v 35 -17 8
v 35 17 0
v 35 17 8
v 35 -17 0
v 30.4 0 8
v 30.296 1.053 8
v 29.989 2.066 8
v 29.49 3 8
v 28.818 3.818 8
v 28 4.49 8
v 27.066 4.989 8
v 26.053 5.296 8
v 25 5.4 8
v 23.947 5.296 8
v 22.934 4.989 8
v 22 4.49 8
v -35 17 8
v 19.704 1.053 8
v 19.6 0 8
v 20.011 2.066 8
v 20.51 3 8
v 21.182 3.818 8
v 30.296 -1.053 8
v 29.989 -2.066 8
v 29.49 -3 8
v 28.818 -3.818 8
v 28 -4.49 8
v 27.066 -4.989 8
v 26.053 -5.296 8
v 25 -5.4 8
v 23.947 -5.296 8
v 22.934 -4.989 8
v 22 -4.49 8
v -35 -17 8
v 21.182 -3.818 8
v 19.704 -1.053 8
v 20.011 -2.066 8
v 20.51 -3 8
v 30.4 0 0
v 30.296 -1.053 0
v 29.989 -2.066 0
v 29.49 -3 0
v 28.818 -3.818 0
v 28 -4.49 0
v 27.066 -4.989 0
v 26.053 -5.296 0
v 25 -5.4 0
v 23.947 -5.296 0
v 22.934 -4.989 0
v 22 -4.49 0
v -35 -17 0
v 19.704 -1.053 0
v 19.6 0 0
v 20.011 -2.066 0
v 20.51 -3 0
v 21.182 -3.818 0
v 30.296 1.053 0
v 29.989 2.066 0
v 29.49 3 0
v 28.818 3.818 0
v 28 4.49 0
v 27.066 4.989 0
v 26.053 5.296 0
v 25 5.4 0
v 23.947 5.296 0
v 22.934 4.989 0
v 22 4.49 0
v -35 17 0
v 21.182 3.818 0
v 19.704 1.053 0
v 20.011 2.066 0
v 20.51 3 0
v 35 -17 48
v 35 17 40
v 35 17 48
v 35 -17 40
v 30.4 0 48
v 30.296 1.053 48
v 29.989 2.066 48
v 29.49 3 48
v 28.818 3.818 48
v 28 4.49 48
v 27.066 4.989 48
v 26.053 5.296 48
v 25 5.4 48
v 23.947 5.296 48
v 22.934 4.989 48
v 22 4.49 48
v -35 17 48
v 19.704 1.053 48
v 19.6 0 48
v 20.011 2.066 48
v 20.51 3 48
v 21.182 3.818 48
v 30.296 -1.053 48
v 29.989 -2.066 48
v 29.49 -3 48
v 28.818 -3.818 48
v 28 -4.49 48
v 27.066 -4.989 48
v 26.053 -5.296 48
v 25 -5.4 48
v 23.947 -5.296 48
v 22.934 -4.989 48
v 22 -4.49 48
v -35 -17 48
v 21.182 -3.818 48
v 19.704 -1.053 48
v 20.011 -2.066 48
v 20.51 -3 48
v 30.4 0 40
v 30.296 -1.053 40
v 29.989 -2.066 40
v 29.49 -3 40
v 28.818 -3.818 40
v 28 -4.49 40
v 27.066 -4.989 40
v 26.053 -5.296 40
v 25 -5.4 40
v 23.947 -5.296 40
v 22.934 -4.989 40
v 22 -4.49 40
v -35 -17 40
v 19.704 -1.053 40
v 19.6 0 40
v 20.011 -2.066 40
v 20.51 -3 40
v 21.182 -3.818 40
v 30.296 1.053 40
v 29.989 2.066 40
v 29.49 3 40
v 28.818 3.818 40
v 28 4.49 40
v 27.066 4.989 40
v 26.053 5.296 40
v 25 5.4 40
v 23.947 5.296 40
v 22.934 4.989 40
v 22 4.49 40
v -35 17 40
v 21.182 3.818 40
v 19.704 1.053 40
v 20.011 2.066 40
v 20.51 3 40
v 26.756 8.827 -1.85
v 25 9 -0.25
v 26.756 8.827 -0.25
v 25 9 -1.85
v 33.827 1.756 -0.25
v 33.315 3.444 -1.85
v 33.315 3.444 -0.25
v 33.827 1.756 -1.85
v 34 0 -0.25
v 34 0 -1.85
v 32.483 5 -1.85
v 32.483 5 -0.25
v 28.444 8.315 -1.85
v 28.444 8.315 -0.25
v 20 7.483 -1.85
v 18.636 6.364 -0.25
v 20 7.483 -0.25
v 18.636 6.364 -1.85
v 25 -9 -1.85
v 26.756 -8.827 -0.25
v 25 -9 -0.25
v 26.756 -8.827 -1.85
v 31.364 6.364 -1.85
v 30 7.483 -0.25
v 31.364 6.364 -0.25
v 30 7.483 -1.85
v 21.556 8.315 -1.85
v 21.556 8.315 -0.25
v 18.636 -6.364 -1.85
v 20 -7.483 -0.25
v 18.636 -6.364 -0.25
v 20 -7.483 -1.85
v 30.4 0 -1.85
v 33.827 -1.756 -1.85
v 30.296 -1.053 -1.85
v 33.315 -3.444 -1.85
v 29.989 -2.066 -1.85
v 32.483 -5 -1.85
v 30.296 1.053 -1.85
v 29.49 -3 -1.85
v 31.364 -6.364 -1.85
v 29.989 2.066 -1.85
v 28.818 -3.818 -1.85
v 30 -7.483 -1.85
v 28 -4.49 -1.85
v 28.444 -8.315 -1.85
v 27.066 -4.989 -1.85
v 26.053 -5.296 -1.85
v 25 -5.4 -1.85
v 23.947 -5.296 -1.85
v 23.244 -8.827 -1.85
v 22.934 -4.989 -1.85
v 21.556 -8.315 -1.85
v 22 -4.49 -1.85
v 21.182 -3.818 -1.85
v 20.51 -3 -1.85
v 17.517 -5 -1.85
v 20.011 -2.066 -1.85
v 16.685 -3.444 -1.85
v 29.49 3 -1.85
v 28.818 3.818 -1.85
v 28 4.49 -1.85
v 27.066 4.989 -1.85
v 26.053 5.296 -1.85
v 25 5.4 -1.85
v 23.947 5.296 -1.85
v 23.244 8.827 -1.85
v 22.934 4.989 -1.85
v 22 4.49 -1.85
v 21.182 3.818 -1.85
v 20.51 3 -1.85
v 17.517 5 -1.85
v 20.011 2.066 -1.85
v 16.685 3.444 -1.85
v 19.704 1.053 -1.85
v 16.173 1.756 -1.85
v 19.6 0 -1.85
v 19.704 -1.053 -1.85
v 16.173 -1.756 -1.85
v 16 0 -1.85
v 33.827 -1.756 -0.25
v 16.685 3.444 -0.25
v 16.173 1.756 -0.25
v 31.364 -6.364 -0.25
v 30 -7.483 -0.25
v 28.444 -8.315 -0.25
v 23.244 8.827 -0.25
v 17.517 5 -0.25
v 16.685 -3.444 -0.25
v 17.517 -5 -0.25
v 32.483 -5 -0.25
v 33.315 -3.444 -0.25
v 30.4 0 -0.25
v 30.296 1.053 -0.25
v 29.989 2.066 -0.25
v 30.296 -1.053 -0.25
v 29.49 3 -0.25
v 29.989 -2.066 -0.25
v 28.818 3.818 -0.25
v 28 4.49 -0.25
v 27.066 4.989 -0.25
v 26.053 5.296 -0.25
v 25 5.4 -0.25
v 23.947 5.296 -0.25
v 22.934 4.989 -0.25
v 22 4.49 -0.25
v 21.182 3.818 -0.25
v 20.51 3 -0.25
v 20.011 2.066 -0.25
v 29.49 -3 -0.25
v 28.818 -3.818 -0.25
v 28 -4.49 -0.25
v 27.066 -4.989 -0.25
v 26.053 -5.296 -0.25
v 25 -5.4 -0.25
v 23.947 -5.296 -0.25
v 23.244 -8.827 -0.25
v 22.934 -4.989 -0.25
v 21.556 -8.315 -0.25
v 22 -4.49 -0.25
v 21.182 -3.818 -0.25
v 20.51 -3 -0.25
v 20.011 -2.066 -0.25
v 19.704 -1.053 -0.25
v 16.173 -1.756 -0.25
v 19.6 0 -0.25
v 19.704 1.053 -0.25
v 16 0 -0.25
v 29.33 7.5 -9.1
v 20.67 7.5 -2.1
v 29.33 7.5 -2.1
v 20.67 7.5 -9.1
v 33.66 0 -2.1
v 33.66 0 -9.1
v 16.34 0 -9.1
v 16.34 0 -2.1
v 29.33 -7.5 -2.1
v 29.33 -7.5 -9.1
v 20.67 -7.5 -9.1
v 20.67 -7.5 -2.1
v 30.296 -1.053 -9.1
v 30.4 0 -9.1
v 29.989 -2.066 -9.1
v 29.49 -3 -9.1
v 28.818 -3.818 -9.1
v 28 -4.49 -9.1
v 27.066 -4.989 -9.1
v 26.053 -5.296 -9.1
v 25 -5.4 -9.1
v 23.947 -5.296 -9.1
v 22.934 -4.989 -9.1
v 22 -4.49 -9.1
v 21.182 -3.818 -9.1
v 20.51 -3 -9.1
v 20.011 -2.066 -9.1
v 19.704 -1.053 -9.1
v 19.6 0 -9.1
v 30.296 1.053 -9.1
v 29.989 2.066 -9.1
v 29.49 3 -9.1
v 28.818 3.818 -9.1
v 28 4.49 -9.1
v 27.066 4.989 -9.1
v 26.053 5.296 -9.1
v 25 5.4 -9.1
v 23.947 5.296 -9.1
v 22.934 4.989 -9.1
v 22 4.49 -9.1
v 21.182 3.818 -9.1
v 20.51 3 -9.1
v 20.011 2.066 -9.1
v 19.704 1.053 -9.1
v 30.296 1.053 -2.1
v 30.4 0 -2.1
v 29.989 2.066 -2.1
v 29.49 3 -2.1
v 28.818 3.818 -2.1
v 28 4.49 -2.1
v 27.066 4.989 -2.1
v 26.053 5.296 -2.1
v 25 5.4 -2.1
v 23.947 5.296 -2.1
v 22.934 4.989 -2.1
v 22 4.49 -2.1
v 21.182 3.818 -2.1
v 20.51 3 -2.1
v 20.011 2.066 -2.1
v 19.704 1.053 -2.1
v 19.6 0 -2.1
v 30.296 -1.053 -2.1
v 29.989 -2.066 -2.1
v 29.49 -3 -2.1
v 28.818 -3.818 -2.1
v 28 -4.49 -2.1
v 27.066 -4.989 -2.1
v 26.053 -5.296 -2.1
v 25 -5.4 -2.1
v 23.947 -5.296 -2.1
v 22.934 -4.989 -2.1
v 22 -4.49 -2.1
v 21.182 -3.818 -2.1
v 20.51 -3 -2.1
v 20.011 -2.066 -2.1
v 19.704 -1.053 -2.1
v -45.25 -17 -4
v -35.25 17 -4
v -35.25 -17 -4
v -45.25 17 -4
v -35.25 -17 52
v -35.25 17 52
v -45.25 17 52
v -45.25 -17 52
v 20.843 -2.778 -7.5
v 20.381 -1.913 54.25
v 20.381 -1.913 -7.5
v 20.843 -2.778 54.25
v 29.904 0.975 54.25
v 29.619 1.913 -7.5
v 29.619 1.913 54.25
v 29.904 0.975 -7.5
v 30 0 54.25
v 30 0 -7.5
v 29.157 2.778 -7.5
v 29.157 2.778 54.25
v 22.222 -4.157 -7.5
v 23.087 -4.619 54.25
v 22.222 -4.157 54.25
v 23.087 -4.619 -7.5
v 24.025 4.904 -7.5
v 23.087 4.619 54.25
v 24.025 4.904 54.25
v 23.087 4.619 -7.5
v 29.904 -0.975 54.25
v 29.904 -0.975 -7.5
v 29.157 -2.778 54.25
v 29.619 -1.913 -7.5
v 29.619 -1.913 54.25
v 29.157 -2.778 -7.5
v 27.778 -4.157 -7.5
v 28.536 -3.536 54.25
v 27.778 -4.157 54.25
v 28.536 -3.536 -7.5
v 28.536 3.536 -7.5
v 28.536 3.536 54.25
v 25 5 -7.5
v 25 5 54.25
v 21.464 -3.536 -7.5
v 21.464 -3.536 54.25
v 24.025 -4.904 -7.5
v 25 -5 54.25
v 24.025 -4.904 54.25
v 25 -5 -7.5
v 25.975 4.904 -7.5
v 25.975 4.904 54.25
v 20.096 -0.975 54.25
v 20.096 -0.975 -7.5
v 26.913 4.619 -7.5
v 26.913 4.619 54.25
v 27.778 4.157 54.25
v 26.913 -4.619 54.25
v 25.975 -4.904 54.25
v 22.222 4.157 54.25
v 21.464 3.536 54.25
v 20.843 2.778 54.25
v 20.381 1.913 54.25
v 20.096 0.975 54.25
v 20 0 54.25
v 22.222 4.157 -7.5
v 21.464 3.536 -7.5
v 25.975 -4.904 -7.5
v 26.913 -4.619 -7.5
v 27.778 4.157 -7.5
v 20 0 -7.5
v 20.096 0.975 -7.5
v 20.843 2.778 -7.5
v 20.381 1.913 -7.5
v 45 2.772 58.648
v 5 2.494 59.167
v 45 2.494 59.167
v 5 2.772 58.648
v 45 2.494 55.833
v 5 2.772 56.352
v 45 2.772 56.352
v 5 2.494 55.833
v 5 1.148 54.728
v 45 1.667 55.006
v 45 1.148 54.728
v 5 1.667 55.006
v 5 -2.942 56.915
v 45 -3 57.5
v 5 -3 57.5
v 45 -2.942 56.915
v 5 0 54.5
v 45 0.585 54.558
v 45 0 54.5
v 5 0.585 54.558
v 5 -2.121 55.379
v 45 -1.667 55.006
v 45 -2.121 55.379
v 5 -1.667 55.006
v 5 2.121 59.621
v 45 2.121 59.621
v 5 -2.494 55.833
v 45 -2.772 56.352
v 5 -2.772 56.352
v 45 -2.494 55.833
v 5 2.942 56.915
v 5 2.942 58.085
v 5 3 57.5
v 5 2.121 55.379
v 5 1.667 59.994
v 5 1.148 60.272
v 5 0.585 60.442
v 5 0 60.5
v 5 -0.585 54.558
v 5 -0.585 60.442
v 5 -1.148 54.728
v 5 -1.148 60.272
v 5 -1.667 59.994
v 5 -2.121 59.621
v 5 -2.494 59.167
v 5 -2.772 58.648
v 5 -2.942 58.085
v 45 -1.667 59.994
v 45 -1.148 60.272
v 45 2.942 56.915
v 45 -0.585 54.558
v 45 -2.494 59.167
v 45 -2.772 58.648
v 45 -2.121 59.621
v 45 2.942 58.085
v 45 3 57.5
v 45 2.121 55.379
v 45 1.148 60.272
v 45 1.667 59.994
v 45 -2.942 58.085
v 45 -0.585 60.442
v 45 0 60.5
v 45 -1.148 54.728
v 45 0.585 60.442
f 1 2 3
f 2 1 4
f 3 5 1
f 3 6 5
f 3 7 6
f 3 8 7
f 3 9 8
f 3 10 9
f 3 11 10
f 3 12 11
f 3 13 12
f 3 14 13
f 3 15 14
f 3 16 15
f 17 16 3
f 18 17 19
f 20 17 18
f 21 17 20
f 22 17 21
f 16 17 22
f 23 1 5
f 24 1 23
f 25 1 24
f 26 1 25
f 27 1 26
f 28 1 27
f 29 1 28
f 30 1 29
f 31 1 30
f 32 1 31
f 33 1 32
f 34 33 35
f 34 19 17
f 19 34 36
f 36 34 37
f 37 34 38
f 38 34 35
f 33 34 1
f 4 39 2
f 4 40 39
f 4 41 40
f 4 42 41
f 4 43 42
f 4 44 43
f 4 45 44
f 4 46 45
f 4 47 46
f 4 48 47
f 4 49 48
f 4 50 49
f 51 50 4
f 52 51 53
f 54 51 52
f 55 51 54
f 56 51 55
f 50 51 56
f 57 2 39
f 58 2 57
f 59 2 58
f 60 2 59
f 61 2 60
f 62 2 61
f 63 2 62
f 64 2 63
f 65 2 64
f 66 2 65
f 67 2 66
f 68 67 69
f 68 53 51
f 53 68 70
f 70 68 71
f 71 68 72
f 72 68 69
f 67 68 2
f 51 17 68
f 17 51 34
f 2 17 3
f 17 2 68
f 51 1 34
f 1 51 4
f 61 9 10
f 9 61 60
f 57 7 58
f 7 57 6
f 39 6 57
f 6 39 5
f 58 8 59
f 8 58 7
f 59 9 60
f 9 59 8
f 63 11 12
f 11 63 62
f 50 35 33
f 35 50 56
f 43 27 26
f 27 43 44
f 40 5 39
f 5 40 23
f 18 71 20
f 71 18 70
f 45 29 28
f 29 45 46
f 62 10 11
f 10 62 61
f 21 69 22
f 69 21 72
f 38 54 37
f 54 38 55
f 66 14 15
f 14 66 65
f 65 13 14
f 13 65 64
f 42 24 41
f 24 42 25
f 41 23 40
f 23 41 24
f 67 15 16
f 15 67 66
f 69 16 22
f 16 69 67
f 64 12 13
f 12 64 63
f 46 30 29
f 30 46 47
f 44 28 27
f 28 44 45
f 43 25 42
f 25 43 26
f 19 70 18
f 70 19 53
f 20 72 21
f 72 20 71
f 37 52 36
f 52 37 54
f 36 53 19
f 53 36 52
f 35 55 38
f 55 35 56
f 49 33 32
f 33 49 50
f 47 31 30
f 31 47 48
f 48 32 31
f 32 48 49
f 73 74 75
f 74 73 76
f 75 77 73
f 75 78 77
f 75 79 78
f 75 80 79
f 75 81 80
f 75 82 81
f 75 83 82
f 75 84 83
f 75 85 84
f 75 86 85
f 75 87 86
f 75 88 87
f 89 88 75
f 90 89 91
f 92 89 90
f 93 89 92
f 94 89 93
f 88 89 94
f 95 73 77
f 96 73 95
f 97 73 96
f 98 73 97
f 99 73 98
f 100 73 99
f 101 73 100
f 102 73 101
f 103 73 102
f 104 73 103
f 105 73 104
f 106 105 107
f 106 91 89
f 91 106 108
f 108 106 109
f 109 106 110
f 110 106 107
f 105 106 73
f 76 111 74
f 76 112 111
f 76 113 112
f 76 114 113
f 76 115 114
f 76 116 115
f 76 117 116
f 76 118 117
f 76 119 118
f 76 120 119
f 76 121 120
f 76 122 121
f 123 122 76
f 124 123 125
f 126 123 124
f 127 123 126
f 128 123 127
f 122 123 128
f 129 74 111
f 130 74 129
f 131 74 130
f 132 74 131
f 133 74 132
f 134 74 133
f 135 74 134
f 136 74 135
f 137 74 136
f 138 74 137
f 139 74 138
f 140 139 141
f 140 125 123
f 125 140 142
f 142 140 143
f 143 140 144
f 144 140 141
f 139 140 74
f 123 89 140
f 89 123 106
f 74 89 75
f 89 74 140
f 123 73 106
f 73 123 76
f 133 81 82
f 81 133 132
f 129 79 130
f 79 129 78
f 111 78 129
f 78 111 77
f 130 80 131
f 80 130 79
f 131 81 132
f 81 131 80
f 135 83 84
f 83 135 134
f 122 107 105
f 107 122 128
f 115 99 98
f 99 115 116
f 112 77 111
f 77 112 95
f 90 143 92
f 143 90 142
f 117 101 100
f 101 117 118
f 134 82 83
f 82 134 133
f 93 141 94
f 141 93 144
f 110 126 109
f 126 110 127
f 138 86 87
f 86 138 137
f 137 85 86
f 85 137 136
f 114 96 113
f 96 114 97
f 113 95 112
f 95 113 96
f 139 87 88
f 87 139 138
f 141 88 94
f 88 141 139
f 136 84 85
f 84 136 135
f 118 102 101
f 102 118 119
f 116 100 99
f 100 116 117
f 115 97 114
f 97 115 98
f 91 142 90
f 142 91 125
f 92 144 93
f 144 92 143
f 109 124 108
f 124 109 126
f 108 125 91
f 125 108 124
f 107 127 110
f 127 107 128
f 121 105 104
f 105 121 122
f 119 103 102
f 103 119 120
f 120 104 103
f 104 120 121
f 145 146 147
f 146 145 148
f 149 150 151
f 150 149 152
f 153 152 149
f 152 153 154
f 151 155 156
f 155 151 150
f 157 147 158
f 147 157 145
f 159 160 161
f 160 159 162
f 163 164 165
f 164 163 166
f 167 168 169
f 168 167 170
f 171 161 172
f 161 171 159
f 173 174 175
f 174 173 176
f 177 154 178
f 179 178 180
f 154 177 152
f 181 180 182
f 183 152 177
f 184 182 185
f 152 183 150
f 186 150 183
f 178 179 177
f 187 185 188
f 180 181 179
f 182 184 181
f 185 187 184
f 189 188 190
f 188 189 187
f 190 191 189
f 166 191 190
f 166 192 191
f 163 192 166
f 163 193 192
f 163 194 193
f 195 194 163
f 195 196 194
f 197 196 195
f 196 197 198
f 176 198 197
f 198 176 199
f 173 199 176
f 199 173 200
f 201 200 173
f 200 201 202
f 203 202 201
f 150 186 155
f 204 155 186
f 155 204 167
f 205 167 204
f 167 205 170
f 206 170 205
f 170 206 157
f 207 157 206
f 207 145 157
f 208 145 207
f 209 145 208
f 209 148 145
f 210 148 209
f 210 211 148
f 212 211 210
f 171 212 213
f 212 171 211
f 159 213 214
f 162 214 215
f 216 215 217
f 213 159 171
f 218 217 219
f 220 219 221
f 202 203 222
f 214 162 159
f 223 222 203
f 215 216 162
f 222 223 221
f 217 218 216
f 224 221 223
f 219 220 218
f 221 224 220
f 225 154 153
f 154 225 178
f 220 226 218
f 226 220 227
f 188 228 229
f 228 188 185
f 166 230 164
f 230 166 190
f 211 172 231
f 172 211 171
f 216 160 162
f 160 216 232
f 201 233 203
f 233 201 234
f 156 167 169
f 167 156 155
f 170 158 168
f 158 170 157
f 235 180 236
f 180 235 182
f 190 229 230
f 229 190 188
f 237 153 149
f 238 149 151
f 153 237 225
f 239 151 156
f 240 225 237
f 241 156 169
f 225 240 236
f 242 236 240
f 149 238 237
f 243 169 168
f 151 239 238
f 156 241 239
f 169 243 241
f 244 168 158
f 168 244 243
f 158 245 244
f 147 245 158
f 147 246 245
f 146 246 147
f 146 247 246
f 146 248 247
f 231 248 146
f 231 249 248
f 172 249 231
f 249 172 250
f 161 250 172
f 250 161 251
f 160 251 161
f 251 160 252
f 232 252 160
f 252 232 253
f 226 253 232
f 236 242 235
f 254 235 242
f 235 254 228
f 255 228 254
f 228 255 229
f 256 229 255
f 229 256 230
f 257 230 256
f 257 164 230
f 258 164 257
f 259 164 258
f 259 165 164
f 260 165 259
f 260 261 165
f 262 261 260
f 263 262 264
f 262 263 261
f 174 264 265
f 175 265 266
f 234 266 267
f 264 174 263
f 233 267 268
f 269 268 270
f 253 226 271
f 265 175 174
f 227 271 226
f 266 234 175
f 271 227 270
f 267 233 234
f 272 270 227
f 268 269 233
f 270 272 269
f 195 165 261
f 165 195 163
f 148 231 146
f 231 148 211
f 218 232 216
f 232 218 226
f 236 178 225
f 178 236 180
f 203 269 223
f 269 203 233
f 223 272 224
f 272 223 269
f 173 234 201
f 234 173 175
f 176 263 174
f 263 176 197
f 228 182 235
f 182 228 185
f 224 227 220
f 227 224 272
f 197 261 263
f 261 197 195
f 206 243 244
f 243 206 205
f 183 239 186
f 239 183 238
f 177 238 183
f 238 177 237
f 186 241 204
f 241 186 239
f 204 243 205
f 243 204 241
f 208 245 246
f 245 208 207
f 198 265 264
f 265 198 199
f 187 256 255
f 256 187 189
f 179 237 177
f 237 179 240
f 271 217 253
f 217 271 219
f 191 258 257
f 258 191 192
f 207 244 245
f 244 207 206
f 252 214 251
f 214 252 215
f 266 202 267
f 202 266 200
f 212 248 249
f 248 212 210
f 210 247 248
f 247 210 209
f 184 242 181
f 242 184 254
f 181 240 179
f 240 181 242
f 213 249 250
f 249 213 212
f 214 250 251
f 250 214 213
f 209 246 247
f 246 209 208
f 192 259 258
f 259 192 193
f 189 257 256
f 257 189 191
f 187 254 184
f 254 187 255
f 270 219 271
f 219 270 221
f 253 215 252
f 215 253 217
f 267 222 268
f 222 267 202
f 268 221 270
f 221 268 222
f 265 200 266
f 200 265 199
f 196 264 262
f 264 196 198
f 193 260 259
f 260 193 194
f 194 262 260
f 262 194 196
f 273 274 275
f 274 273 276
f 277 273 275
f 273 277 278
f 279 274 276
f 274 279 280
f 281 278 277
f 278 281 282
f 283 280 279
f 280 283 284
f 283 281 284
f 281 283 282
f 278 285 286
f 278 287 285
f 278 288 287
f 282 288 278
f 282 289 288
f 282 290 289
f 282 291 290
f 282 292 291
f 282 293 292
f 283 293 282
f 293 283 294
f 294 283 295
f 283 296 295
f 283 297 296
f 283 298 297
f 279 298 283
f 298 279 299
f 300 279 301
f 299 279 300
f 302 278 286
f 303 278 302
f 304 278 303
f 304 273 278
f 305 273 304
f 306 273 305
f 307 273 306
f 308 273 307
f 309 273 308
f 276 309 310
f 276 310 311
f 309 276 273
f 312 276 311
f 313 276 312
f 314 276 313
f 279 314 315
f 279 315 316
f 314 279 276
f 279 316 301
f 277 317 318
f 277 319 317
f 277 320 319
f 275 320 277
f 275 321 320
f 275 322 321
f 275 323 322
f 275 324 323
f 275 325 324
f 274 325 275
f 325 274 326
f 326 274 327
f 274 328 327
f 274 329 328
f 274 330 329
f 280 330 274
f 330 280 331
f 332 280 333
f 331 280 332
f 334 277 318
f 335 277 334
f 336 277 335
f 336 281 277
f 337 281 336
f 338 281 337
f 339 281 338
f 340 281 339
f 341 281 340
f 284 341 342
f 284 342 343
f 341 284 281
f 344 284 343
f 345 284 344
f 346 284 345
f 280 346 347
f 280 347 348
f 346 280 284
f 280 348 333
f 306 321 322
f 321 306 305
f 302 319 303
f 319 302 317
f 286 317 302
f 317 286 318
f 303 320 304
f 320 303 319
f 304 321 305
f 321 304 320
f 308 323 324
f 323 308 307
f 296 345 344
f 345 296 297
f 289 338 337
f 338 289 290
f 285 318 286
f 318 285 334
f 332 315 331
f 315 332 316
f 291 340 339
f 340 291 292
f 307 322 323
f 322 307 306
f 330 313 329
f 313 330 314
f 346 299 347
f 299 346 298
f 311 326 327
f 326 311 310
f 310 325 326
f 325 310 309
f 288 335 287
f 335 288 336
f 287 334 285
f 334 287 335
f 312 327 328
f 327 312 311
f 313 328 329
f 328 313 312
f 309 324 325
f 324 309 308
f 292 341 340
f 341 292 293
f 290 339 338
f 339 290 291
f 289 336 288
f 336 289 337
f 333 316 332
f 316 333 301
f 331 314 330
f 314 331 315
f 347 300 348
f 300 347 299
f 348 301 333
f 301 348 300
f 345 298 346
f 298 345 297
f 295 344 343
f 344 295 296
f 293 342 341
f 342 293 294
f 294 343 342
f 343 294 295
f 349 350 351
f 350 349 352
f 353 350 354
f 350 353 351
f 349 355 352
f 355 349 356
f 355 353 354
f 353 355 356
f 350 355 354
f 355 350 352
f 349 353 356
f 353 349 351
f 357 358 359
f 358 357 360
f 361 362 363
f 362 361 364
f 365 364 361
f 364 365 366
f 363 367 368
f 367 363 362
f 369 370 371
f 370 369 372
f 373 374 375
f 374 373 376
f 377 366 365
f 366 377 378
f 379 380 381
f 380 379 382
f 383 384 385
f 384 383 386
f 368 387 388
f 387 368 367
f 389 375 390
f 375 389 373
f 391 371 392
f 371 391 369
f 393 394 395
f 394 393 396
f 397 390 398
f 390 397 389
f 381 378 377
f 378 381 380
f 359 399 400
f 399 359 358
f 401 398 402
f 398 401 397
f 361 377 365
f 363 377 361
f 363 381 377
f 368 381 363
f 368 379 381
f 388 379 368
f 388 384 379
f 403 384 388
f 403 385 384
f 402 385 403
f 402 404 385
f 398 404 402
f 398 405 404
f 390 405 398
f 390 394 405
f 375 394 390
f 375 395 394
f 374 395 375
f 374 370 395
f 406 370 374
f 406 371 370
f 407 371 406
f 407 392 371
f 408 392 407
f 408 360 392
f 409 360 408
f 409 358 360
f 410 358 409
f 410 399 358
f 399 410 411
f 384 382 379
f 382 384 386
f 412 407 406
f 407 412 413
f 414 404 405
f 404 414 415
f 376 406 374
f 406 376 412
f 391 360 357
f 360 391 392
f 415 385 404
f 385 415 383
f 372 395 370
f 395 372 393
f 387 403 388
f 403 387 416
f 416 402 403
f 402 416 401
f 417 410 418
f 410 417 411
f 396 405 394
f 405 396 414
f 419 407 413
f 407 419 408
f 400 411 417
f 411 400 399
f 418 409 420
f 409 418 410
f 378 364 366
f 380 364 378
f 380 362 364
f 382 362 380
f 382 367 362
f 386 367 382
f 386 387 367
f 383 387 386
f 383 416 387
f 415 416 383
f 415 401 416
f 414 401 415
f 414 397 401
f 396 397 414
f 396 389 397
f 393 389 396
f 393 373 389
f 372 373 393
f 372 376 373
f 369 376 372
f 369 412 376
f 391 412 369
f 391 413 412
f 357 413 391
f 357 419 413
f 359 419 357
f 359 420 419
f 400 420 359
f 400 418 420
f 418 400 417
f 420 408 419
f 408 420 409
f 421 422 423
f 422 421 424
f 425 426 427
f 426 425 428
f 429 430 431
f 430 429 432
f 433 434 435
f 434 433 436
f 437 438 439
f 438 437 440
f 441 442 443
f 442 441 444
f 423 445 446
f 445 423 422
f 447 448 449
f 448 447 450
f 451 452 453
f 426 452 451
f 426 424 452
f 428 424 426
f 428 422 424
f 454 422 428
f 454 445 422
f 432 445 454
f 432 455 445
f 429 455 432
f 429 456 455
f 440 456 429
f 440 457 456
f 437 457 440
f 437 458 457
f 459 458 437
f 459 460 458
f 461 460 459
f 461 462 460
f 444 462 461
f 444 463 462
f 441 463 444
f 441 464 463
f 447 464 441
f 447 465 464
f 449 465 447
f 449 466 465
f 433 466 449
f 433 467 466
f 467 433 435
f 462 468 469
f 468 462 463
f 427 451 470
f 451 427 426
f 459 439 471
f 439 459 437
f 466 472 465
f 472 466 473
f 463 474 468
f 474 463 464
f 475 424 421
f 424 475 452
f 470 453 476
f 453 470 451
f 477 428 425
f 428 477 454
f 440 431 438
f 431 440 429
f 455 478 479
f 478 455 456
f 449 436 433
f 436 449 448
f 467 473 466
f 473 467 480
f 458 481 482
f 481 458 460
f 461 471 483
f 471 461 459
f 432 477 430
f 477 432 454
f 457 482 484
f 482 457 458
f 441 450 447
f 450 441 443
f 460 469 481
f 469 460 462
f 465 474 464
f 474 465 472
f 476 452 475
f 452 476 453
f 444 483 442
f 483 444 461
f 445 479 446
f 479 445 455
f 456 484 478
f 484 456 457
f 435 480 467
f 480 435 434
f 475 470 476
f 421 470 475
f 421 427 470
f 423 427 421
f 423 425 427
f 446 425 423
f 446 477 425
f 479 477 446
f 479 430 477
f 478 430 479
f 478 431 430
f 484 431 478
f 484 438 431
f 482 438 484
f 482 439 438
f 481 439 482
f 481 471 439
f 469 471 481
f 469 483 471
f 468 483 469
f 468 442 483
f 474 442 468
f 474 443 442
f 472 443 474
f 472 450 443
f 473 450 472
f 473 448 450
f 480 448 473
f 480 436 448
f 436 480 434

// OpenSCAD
$fn = 32;

// ------------------------------------------------------------------------
// C clamp: throat 40 mm, screw d10
// Every part is its own module, assembly() places every instance.
// ------------------------------------------------------------------------

// --- part 1 ---
module clamp_arm() {
  difference() {
    translate([-35, -17, 0]) cube([70, 34, 8]);
    translate([25, 0, -1]) cylinder(h = 10, d = 10.8);
  }
}

// --- part 2 ---
module clamp_spine() {
  difference() {
    translate([-28, -17, 0]) cube([56, 34, 10]);
  }
}

// --- part 3 ---
module clamp_screw() {
  translate([0, 0, -30.875]) cylinder(h = 61.75, d = 10);
}

// --- part 4 ---
module clamp_washer() {
  difference() {
      translate([0, 0, 0]) cylinder(h = 1.6, d = 18);
      translate([0, 0, -1]) cylinder(h = 3.6, d = 10.8);
    }
}

// --- part 5 ---
module clamp_nut() {
  difference() {
    linear_extrude(height = 7) polygon(points = [[8.66, 0], [4.33, 7.5], [-4.33, 7.5], [-8.66, 0], [-4.33, -7.5], [4.33, -7.5]]);
    translate([0, 0, -1]) cylinder(h = 9, d = 10.8);
  }
}

// --- part 6 ---
module tommy_bar() {
  translate([0, 0, -20]) cylinder(h = 40, d = 6);
}

// --- assembly ---
module assembly() {
  color([0.80, 0.24, 0.20]) translate([0, 0, 0]) rotate([0, 0, 0]) clamp_arm();
  color([0.20, 0.45, 0.75]) translate([0, 0, 40]) rotate([0, 0, 0]) clamp_arm();
  color([0.25, 0.62, 0.32]) translate([-45.25, 0, 24]) rotate([0, 90, 0]) clamp_spine();
  color([0.92, 0.70, 0.18]) translate([25, 0, 23.375]) rotate([0, 0, 0]) clamp_screw();
  color([0.58, 0.35, 0.70]) translate([25, 0, -1.85]) rotate([0, 0, 0]) clamp_washer();
  color([0.16, 0.66, 0.66]) translate([25, 0, -9.1]) rotate([0, 0, 0]) clamp_nut();
  color([0.85, 0.48, 0.18]) translate([25, 0, 57.5]) rotate([0, 90, 0]) tommy_bar();
}

assembly();
